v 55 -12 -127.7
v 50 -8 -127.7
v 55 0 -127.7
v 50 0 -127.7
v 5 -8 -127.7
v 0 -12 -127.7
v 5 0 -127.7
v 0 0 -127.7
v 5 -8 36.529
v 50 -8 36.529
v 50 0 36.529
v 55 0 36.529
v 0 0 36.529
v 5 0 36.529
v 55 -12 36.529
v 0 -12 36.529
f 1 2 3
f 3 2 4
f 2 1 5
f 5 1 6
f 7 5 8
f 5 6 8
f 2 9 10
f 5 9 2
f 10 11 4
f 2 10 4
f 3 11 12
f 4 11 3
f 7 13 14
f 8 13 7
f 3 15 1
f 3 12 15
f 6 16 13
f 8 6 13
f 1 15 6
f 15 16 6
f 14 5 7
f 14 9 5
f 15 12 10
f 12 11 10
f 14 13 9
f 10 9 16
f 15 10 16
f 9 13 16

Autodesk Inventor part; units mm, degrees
ref_plane "YZ Plane" through (0, 0, 0) normal (1, 0, 0) x (0, 1, 0)
ref_plane "XZ Plane" through (0, 0, 0) normal (0, 1, 0) x (-1, 0, 0)
ref_plane "XY Plane" through (0, 0, 0) normal (0, 0, 1) x (1, 0, 0)
sketch "Sketch1" plane through (0, 0, 0) normal (1, 0, 0) x (0, 1, 0)
  line L0 (0, 36.5286) -> (0, -127.7004)
  line L1 (0, 36.5286) -> (-8, 36.5286)
  line L2 (-8, 36.5286) -> (-8, -127.7004)
  line L3 (-8, -127.7004) -> (-5.4683, -127.7004)
  line L4 (-5.4683, -127.7004) -> (-2.7019, -127.7004)
  line L5 (-2.7019, -127.7004) -> (0, -127.7004)
  line L6 (-8, 36.5286) -> (-10, 36.5286)
  line L7 (-10, 36.5286) -> (-12, 36.5286)
  line L8 (-12, 36.5286) -> (-12, -127.7004)
  line L9 (-12, -127.7004) -> (-8, -127.7004)
  point P0 (0, 0)
  dimension "d0" = 164.229
  dimension "d1" = 8
  dimension "d2" = 2
  dimension "d3" = 2
extrude "Extrusion1" add sketch "Sketch1" along normal blind 5 contours L0 L5 L4 L3 L2 L1
sketch "Sketch2" plane through (0, 0, 0) normal (-1, 0, 0) x (0, 0, 1)
  point P0 (0, 0)
extrude "Extrusion2" add sketch "Sketch1" along normal blind 50 contours L2 L9 L8 L7 L6
sketch "Sketch3" plane through (50, 0, 0) normal (1, 0, 0) x (0, 0, -1)
  line L0 (-36.5286, -12) -> (127.7004, -12) projected
  line L1 (-36.5286, 0) -> (-36.5286, -12) projected
  line L2 (-36.5286, -12) -> (-36.5286, 0)
  line L3 (127.7004, -12) -> (127.7004, 0) projected
  line L4 (-36.5286, 0) -> (127.7004, 0)
  line L5 (127.7004, 0) -> (127.7004, -12)
  line L6 (127.7004, -12) -> (-36.5286, -12)
  point P0 (0, 0)
  dimension "d8" = 12
extrude "Extrusion3" add sketch "Sketch3" along normal blind 5
properties part number "Flange" material "Aluminum 6061-AHC"
